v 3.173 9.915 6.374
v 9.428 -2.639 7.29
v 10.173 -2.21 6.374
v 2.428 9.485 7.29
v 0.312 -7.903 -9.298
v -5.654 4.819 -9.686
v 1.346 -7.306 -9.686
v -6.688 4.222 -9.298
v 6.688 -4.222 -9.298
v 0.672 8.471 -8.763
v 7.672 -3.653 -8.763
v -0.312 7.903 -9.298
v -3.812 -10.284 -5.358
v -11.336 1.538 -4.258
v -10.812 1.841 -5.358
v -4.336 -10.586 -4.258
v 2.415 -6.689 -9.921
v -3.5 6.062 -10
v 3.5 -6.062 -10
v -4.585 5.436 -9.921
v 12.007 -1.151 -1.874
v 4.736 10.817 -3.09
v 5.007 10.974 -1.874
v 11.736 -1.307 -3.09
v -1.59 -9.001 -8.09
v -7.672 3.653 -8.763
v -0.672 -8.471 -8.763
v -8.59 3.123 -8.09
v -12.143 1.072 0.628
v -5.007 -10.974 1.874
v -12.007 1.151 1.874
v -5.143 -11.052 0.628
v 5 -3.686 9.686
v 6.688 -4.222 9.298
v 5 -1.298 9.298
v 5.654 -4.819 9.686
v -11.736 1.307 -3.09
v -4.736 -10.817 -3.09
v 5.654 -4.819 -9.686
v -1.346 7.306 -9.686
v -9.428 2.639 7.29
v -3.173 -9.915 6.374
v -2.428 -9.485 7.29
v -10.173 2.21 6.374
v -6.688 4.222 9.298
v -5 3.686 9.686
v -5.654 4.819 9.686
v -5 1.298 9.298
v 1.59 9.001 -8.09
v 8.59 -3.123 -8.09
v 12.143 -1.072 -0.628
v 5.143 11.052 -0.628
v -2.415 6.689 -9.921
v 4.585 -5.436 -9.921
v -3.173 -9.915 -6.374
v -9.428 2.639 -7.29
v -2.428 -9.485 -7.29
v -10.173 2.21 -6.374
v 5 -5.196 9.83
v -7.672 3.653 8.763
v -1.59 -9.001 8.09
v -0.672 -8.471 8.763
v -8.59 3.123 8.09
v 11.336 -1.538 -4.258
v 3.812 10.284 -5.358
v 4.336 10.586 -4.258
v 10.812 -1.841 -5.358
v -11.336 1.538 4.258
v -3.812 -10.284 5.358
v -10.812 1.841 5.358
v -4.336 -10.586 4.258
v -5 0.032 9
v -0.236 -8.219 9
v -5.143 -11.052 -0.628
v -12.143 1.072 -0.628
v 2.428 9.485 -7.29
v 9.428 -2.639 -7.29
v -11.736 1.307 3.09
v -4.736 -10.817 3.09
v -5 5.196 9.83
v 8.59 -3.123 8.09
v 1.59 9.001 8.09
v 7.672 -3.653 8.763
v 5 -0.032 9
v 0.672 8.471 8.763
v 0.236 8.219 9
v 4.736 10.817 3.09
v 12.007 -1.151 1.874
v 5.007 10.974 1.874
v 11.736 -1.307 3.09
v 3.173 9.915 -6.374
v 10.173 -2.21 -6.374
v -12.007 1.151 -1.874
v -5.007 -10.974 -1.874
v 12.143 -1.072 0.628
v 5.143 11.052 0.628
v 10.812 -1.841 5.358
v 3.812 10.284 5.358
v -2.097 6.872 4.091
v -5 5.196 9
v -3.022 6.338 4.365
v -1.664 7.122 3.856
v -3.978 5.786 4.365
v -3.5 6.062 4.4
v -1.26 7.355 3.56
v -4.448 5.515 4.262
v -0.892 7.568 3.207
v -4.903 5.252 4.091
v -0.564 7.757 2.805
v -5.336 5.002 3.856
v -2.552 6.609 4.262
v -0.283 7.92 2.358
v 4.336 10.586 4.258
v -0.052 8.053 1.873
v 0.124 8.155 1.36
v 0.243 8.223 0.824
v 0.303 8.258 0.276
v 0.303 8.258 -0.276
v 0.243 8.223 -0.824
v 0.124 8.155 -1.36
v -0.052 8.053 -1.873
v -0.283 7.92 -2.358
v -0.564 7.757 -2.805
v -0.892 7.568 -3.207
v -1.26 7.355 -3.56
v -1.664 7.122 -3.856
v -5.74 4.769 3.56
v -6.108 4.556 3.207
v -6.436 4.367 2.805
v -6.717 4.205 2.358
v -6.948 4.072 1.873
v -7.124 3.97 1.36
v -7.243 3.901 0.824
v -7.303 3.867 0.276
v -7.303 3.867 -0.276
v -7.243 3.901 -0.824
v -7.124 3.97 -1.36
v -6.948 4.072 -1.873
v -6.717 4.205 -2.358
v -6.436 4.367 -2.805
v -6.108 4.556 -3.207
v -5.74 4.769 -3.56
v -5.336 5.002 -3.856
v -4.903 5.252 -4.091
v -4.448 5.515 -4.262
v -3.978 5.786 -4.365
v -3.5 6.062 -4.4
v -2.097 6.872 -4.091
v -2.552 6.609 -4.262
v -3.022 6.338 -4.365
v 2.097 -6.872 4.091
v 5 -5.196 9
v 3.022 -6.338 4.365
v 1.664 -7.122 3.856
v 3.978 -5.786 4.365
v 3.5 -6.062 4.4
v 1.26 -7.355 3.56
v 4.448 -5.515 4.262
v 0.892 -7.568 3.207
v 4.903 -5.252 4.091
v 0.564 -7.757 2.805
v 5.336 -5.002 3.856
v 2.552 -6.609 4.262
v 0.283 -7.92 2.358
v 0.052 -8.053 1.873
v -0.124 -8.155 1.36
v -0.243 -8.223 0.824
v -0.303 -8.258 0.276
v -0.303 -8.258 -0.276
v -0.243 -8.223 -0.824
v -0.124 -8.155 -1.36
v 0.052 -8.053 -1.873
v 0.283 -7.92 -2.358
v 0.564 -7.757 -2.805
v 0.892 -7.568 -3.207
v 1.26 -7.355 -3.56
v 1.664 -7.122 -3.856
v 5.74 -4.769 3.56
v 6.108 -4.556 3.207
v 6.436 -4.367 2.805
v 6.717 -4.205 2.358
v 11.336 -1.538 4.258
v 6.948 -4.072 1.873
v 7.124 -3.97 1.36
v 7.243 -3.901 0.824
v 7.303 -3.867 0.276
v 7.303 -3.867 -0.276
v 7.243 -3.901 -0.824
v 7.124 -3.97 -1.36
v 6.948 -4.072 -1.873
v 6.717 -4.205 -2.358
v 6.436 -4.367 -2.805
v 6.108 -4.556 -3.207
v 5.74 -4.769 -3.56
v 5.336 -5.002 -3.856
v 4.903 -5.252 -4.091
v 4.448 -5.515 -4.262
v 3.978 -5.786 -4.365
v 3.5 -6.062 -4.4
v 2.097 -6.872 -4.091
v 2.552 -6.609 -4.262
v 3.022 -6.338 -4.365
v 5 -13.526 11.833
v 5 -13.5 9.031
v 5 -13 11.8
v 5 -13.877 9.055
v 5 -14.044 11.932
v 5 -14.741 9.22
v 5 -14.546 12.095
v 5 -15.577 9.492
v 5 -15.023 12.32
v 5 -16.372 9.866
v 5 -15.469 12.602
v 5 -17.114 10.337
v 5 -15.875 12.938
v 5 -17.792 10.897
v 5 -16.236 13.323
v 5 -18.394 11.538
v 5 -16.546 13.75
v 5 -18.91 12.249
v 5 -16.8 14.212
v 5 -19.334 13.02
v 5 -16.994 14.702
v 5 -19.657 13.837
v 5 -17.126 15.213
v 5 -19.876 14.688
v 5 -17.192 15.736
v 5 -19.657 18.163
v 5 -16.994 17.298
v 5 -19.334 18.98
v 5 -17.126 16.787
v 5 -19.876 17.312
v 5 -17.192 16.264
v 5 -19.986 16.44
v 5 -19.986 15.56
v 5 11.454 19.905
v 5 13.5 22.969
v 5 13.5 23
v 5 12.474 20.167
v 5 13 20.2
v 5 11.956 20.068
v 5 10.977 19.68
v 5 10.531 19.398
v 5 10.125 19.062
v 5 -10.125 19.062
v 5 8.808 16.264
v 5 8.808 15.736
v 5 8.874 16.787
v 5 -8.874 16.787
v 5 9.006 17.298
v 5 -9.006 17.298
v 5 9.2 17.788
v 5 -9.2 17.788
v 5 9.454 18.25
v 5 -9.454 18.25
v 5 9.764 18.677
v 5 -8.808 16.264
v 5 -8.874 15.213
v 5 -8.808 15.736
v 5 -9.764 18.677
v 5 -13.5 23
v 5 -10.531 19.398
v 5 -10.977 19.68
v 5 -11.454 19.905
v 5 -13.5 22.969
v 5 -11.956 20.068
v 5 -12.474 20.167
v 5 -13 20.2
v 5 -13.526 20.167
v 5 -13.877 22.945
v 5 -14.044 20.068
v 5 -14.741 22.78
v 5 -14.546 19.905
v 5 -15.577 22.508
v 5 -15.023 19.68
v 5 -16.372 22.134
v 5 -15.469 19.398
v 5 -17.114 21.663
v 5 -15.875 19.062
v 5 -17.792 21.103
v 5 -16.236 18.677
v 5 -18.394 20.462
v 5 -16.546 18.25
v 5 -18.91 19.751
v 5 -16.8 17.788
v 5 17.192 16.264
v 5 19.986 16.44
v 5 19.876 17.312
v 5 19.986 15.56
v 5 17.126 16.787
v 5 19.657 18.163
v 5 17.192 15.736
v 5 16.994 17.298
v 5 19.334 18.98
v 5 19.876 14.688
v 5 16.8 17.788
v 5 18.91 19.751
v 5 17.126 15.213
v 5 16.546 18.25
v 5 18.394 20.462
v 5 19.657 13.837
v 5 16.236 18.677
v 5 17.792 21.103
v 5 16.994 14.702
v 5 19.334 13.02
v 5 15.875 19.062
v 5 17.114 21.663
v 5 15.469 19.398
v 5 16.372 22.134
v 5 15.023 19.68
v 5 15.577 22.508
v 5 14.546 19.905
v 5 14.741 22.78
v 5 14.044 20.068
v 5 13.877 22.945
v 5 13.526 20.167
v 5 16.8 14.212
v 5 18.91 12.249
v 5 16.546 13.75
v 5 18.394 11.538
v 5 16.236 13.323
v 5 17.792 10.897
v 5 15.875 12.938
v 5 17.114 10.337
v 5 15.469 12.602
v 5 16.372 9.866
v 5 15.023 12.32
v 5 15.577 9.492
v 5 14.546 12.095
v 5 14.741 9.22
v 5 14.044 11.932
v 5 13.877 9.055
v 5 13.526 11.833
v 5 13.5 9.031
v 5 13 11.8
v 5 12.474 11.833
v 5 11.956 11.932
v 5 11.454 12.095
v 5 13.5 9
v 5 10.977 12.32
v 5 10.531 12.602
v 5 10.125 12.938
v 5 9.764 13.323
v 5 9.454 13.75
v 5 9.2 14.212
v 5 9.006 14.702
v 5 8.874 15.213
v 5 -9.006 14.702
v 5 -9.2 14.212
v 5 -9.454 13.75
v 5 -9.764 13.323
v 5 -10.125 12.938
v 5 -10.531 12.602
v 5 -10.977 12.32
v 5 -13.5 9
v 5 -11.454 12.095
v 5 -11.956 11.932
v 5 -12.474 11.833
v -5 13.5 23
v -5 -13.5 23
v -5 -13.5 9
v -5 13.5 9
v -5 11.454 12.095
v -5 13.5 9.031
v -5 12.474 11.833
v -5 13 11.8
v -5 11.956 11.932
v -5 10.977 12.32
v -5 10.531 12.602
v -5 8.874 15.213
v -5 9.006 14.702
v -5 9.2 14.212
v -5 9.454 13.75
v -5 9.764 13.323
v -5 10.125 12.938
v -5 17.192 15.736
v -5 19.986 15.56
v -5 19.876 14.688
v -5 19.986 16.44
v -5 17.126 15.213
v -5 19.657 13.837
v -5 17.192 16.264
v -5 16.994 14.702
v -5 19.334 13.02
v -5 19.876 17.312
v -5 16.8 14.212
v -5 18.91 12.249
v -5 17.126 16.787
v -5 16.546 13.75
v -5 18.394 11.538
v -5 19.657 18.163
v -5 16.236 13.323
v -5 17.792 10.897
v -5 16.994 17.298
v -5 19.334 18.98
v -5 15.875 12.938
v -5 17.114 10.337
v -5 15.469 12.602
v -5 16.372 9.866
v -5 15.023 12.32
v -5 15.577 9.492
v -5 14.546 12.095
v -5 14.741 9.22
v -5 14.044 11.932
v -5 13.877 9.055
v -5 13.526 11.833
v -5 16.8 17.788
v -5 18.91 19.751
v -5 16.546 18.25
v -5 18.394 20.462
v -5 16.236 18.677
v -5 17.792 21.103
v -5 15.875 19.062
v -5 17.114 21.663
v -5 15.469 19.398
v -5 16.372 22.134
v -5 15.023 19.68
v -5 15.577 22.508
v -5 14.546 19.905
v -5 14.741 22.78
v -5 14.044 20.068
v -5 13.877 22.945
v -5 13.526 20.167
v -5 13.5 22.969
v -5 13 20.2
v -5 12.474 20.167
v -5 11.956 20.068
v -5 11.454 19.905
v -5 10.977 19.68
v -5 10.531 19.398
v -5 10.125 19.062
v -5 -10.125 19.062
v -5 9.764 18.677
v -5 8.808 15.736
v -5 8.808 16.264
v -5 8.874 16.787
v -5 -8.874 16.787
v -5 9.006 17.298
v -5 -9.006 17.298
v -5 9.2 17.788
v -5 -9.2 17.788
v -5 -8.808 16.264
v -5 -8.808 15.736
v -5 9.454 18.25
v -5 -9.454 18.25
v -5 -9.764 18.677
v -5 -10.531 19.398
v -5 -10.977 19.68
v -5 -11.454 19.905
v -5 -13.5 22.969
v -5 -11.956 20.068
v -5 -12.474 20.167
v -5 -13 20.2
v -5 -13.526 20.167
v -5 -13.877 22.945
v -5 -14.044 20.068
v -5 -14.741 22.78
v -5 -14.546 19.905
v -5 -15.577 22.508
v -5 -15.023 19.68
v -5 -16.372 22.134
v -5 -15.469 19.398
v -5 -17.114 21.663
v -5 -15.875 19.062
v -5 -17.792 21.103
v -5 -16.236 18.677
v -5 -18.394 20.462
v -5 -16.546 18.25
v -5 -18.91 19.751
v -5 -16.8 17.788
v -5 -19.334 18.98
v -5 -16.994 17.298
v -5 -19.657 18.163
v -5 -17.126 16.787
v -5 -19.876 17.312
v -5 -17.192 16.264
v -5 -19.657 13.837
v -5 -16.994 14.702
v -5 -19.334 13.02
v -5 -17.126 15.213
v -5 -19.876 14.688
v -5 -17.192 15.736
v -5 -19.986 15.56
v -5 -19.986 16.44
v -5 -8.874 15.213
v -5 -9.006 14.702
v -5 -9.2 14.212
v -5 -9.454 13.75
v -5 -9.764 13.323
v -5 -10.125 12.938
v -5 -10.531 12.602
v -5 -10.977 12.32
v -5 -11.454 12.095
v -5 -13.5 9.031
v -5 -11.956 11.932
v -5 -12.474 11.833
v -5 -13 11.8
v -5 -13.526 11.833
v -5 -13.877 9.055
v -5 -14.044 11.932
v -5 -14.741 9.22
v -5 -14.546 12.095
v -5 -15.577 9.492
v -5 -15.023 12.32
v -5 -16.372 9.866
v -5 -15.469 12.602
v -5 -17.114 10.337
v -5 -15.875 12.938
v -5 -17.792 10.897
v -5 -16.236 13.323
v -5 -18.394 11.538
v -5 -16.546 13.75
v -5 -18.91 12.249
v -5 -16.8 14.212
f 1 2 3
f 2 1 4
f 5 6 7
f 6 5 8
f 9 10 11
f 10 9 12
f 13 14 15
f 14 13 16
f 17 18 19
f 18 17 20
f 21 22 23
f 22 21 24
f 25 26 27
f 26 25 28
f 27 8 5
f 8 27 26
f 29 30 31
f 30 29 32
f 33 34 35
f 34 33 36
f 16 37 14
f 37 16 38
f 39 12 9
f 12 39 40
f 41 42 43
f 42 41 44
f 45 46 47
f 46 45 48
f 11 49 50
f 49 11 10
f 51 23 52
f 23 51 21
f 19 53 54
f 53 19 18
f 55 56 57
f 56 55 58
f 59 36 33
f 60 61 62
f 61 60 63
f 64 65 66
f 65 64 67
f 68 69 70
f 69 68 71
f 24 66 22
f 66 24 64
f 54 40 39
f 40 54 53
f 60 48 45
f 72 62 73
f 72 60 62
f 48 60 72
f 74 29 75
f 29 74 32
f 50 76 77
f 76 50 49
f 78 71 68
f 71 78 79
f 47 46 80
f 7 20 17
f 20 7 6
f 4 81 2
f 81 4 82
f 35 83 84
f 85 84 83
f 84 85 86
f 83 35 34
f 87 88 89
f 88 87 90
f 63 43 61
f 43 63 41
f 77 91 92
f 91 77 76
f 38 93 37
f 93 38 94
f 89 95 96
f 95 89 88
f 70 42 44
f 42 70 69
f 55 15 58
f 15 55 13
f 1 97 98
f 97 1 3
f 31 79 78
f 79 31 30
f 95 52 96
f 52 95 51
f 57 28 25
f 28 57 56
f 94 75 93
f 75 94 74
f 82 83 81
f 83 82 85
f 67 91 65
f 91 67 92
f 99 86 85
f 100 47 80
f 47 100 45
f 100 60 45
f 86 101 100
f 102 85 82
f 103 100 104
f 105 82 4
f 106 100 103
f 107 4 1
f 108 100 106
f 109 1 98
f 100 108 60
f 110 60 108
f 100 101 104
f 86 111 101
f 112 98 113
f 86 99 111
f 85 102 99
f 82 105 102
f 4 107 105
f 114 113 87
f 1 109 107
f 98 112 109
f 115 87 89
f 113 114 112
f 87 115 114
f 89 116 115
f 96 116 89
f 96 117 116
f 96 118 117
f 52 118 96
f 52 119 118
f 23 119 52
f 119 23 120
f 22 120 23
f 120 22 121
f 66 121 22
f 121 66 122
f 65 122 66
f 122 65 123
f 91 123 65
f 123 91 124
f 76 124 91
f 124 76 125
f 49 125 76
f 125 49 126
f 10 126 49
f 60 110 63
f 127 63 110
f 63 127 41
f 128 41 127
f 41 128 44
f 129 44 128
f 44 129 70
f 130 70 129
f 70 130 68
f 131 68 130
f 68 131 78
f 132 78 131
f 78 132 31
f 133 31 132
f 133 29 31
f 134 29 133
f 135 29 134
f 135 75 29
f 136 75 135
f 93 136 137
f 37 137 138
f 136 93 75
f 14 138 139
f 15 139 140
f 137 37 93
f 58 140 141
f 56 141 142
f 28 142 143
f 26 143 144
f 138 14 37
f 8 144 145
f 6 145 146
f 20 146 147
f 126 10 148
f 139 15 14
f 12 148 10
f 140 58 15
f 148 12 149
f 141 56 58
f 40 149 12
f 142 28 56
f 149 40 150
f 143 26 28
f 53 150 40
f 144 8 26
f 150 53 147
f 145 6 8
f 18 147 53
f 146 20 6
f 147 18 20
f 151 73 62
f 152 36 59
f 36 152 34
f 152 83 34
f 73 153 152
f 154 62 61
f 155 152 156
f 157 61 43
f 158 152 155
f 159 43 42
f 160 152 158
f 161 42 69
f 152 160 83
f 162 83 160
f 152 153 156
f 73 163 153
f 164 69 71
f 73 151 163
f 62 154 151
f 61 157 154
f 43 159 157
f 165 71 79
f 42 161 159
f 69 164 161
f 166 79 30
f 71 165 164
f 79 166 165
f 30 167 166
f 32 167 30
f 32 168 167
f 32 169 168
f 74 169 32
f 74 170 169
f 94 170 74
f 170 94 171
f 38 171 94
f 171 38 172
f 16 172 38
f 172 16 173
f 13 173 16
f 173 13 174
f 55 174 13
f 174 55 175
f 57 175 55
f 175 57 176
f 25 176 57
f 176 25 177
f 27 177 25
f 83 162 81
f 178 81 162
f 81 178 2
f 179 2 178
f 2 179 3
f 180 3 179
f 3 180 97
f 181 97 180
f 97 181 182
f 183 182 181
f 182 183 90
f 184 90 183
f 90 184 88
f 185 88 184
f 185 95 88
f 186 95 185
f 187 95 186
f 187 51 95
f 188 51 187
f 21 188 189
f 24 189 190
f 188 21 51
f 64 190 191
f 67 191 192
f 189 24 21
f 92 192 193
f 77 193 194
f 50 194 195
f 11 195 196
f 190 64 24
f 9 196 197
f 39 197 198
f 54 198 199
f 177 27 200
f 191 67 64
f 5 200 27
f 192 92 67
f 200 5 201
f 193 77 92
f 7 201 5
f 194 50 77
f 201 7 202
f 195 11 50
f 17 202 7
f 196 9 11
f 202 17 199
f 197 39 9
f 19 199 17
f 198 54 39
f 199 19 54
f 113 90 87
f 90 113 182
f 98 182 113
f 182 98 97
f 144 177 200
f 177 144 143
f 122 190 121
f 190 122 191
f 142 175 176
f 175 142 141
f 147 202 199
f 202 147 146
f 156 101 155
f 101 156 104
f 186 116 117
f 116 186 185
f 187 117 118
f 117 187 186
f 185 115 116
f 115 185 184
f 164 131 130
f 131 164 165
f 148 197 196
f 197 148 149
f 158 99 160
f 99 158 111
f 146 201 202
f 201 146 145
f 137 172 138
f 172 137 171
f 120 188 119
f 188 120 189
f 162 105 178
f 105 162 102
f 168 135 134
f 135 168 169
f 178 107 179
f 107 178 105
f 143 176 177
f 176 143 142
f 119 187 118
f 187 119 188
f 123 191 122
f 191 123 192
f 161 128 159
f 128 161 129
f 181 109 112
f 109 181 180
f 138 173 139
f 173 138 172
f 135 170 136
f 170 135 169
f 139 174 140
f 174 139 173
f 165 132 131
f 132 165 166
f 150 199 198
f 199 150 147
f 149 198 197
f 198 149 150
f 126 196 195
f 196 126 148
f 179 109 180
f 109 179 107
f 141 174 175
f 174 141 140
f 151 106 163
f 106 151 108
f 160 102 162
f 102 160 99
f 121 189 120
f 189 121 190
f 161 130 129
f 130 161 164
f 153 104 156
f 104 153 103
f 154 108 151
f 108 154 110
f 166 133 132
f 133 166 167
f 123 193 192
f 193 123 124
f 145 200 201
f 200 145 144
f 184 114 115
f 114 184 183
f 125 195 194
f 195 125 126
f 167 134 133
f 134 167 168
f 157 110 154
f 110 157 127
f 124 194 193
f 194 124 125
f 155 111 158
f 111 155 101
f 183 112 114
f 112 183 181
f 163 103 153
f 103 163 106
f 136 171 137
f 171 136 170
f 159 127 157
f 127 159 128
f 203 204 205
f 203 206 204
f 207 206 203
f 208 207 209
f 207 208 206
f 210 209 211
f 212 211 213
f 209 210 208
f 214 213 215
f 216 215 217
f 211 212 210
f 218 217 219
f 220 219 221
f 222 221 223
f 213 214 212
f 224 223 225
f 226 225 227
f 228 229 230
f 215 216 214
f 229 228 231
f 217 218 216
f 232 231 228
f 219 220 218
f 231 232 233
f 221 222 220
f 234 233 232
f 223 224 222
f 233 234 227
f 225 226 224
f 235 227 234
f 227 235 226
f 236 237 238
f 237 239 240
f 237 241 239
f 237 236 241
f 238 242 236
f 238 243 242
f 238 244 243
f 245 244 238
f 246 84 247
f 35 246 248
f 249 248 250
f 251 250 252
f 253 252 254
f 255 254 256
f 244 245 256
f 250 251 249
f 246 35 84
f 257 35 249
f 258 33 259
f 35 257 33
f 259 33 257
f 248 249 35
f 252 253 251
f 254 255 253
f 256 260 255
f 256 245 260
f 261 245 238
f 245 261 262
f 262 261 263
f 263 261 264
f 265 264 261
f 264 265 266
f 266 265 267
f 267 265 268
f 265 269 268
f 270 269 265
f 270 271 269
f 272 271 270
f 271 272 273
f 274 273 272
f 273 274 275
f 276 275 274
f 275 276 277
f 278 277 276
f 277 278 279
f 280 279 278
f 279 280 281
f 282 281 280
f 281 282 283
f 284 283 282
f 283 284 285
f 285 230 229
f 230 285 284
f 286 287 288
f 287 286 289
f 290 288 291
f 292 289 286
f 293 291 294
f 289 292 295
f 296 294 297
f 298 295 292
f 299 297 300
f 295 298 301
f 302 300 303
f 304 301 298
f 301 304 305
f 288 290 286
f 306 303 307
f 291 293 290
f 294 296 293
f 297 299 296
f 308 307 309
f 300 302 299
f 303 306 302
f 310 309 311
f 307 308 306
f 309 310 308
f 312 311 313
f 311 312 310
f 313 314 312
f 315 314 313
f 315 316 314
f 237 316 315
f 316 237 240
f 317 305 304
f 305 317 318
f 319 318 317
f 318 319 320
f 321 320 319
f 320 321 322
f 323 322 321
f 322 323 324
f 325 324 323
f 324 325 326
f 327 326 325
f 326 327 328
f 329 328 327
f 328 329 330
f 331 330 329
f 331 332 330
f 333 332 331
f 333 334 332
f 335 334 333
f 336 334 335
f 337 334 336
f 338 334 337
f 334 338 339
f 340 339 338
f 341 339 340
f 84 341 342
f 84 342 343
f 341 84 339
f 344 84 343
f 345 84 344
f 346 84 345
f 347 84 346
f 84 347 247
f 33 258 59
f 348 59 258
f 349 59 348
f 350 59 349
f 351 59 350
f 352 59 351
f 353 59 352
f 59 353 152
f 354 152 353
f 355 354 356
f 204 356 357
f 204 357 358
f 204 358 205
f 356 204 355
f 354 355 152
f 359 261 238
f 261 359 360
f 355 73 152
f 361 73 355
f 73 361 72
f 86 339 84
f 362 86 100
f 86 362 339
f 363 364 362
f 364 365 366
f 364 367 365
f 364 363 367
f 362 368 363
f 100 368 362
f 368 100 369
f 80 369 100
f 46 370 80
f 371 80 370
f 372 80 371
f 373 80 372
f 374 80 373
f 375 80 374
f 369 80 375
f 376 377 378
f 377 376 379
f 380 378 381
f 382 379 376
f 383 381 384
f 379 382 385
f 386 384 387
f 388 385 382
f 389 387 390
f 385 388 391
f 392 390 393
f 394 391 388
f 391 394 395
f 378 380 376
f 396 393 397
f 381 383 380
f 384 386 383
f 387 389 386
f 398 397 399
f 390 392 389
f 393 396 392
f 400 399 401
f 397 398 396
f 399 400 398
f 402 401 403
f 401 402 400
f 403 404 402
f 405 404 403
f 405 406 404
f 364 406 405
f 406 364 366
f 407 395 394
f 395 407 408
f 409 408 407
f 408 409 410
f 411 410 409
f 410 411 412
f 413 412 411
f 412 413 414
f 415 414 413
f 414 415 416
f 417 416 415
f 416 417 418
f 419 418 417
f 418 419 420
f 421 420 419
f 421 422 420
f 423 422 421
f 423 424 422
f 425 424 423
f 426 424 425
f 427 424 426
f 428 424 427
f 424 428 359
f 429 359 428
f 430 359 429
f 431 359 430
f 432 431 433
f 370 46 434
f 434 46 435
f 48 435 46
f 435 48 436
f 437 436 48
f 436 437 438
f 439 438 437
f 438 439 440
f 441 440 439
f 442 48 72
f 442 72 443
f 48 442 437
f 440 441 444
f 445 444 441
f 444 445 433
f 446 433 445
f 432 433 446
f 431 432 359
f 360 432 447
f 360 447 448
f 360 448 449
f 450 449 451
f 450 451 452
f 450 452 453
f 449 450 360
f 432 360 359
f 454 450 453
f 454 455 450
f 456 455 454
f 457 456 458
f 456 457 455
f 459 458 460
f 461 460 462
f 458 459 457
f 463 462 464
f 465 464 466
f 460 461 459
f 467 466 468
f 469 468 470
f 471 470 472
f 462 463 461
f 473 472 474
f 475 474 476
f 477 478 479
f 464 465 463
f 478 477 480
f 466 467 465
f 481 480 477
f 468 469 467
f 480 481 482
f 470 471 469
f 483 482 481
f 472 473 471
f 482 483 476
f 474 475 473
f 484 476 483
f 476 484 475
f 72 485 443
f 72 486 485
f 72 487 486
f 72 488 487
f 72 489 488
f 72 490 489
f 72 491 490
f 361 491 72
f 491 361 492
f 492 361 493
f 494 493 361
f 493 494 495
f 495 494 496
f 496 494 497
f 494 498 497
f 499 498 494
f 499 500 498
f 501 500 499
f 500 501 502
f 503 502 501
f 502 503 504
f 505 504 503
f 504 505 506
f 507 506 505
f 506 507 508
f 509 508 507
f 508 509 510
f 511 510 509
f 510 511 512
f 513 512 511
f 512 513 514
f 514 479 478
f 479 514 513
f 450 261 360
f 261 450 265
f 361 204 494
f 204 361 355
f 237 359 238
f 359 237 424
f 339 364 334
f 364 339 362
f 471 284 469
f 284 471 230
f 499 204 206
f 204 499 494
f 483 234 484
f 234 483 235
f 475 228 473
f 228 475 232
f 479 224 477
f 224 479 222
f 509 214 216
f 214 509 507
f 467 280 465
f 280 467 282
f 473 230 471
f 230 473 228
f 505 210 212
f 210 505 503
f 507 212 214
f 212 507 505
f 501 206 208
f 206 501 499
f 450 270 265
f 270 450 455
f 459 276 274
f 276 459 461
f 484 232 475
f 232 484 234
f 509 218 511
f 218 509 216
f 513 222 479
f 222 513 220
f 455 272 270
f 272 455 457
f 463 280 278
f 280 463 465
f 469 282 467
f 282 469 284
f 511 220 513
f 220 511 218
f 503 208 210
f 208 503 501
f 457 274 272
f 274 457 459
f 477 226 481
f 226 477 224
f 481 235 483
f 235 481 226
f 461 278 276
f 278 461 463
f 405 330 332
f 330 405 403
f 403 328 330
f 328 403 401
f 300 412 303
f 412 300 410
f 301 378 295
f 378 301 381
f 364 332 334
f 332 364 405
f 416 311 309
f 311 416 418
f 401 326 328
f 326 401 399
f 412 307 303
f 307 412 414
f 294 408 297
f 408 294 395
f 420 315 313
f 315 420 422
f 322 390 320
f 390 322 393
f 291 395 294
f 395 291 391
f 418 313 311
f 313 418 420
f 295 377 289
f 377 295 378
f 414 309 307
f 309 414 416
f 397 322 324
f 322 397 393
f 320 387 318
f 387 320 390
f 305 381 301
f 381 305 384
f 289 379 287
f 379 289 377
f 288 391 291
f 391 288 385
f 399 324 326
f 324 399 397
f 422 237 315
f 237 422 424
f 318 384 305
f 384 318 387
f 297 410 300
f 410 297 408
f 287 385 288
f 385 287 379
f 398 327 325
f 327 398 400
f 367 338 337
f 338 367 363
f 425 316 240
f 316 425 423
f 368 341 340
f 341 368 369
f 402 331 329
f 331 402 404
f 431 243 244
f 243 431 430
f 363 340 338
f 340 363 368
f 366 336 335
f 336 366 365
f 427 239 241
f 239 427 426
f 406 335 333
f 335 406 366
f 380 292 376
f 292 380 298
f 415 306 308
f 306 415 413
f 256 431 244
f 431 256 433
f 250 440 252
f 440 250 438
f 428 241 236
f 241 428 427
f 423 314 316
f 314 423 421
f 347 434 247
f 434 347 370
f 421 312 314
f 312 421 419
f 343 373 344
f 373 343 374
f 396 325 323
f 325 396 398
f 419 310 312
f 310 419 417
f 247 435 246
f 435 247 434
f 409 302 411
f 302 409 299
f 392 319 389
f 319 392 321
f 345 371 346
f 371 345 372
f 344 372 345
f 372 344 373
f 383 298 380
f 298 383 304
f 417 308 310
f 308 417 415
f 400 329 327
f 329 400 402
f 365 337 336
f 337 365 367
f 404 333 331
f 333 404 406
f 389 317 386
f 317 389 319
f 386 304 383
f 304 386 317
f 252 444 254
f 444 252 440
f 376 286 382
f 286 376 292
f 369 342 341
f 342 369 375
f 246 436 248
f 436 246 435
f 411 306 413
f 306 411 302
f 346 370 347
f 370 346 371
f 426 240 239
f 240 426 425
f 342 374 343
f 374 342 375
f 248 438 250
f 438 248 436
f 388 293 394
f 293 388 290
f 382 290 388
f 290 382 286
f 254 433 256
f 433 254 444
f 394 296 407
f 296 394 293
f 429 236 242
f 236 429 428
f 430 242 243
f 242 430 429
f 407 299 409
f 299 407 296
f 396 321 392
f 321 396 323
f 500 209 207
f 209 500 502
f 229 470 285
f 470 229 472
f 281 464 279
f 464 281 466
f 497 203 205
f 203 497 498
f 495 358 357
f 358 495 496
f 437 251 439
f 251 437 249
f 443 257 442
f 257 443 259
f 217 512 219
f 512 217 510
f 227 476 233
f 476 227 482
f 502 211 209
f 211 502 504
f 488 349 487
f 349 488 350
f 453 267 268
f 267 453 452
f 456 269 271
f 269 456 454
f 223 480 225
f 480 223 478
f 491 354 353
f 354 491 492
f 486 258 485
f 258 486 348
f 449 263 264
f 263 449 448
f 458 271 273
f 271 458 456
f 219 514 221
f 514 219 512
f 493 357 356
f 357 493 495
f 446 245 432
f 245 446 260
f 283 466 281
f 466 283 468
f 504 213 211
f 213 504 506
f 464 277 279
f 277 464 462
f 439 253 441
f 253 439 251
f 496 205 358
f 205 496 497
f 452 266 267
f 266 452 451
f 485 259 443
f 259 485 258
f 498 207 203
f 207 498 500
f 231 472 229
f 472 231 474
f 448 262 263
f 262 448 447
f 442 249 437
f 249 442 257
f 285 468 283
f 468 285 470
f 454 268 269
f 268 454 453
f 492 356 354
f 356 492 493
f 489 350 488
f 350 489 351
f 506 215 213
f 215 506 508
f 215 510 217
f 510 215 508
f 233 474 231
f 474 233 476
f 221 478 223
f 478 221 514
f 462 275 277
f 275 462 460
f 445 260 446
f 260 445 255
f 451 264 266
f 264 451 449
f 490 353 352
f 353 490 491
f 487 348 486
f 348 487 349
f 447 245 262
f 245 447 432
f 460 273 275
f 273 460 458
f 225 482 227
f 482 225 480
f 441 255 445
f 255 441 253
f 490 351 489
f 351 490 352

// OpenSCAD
$fn = 50;

module fillet(r, h) {
    translate([r / 2, r / 2, 0])

        difference() {
            cube([r + 0.01, r + 0.01, h], center = true);

            translate([r/2, r/2, 0])
                cylinder(r = r, h = h + 1, center = true);

        }
}


module strut(){

	outer = 42;
	inner = 31/2;
	len = 0;
	plate_height = 16;
	outset = 26;

	depth=6;

color("white"){
		rotate([0,0,60]){
		difference(){
		rotate([0,90,0]) cylinder(r=10,h=14,center=true);
//		cube([15,13,13],center=true);
		rotate([0,90,0])
		cylinder(r=4.4,h=28,center=true);

		}
	
	}


	translate([0,0,16])	
		difference(){
		union(){
		cube([10,outer-15,14],center=true);
		translate([-5,13,0])
		rotate([0,90,0])
		cylinder(r=7,h=10);
		translate([-5,-13,0])
		rotate([0,90,0])
		cylinder(r=7,h=10);
		}


		for(j = [-1,1])
		rotate([0,90,0]){
		translate([0,j*13,-10])
		cylinder(r=4.2,h=25);
/*
		if(j == -1)
		translate([-7,j*outer/2,0]) rotate([0,0,0]) fillet(8,25);
		else
		translate([-7,j*outer/2,0]) rotate([180,0,0]) fillet(8,25);
*/

		}

		}

}
}






mirror([0,1,0])
strut();
